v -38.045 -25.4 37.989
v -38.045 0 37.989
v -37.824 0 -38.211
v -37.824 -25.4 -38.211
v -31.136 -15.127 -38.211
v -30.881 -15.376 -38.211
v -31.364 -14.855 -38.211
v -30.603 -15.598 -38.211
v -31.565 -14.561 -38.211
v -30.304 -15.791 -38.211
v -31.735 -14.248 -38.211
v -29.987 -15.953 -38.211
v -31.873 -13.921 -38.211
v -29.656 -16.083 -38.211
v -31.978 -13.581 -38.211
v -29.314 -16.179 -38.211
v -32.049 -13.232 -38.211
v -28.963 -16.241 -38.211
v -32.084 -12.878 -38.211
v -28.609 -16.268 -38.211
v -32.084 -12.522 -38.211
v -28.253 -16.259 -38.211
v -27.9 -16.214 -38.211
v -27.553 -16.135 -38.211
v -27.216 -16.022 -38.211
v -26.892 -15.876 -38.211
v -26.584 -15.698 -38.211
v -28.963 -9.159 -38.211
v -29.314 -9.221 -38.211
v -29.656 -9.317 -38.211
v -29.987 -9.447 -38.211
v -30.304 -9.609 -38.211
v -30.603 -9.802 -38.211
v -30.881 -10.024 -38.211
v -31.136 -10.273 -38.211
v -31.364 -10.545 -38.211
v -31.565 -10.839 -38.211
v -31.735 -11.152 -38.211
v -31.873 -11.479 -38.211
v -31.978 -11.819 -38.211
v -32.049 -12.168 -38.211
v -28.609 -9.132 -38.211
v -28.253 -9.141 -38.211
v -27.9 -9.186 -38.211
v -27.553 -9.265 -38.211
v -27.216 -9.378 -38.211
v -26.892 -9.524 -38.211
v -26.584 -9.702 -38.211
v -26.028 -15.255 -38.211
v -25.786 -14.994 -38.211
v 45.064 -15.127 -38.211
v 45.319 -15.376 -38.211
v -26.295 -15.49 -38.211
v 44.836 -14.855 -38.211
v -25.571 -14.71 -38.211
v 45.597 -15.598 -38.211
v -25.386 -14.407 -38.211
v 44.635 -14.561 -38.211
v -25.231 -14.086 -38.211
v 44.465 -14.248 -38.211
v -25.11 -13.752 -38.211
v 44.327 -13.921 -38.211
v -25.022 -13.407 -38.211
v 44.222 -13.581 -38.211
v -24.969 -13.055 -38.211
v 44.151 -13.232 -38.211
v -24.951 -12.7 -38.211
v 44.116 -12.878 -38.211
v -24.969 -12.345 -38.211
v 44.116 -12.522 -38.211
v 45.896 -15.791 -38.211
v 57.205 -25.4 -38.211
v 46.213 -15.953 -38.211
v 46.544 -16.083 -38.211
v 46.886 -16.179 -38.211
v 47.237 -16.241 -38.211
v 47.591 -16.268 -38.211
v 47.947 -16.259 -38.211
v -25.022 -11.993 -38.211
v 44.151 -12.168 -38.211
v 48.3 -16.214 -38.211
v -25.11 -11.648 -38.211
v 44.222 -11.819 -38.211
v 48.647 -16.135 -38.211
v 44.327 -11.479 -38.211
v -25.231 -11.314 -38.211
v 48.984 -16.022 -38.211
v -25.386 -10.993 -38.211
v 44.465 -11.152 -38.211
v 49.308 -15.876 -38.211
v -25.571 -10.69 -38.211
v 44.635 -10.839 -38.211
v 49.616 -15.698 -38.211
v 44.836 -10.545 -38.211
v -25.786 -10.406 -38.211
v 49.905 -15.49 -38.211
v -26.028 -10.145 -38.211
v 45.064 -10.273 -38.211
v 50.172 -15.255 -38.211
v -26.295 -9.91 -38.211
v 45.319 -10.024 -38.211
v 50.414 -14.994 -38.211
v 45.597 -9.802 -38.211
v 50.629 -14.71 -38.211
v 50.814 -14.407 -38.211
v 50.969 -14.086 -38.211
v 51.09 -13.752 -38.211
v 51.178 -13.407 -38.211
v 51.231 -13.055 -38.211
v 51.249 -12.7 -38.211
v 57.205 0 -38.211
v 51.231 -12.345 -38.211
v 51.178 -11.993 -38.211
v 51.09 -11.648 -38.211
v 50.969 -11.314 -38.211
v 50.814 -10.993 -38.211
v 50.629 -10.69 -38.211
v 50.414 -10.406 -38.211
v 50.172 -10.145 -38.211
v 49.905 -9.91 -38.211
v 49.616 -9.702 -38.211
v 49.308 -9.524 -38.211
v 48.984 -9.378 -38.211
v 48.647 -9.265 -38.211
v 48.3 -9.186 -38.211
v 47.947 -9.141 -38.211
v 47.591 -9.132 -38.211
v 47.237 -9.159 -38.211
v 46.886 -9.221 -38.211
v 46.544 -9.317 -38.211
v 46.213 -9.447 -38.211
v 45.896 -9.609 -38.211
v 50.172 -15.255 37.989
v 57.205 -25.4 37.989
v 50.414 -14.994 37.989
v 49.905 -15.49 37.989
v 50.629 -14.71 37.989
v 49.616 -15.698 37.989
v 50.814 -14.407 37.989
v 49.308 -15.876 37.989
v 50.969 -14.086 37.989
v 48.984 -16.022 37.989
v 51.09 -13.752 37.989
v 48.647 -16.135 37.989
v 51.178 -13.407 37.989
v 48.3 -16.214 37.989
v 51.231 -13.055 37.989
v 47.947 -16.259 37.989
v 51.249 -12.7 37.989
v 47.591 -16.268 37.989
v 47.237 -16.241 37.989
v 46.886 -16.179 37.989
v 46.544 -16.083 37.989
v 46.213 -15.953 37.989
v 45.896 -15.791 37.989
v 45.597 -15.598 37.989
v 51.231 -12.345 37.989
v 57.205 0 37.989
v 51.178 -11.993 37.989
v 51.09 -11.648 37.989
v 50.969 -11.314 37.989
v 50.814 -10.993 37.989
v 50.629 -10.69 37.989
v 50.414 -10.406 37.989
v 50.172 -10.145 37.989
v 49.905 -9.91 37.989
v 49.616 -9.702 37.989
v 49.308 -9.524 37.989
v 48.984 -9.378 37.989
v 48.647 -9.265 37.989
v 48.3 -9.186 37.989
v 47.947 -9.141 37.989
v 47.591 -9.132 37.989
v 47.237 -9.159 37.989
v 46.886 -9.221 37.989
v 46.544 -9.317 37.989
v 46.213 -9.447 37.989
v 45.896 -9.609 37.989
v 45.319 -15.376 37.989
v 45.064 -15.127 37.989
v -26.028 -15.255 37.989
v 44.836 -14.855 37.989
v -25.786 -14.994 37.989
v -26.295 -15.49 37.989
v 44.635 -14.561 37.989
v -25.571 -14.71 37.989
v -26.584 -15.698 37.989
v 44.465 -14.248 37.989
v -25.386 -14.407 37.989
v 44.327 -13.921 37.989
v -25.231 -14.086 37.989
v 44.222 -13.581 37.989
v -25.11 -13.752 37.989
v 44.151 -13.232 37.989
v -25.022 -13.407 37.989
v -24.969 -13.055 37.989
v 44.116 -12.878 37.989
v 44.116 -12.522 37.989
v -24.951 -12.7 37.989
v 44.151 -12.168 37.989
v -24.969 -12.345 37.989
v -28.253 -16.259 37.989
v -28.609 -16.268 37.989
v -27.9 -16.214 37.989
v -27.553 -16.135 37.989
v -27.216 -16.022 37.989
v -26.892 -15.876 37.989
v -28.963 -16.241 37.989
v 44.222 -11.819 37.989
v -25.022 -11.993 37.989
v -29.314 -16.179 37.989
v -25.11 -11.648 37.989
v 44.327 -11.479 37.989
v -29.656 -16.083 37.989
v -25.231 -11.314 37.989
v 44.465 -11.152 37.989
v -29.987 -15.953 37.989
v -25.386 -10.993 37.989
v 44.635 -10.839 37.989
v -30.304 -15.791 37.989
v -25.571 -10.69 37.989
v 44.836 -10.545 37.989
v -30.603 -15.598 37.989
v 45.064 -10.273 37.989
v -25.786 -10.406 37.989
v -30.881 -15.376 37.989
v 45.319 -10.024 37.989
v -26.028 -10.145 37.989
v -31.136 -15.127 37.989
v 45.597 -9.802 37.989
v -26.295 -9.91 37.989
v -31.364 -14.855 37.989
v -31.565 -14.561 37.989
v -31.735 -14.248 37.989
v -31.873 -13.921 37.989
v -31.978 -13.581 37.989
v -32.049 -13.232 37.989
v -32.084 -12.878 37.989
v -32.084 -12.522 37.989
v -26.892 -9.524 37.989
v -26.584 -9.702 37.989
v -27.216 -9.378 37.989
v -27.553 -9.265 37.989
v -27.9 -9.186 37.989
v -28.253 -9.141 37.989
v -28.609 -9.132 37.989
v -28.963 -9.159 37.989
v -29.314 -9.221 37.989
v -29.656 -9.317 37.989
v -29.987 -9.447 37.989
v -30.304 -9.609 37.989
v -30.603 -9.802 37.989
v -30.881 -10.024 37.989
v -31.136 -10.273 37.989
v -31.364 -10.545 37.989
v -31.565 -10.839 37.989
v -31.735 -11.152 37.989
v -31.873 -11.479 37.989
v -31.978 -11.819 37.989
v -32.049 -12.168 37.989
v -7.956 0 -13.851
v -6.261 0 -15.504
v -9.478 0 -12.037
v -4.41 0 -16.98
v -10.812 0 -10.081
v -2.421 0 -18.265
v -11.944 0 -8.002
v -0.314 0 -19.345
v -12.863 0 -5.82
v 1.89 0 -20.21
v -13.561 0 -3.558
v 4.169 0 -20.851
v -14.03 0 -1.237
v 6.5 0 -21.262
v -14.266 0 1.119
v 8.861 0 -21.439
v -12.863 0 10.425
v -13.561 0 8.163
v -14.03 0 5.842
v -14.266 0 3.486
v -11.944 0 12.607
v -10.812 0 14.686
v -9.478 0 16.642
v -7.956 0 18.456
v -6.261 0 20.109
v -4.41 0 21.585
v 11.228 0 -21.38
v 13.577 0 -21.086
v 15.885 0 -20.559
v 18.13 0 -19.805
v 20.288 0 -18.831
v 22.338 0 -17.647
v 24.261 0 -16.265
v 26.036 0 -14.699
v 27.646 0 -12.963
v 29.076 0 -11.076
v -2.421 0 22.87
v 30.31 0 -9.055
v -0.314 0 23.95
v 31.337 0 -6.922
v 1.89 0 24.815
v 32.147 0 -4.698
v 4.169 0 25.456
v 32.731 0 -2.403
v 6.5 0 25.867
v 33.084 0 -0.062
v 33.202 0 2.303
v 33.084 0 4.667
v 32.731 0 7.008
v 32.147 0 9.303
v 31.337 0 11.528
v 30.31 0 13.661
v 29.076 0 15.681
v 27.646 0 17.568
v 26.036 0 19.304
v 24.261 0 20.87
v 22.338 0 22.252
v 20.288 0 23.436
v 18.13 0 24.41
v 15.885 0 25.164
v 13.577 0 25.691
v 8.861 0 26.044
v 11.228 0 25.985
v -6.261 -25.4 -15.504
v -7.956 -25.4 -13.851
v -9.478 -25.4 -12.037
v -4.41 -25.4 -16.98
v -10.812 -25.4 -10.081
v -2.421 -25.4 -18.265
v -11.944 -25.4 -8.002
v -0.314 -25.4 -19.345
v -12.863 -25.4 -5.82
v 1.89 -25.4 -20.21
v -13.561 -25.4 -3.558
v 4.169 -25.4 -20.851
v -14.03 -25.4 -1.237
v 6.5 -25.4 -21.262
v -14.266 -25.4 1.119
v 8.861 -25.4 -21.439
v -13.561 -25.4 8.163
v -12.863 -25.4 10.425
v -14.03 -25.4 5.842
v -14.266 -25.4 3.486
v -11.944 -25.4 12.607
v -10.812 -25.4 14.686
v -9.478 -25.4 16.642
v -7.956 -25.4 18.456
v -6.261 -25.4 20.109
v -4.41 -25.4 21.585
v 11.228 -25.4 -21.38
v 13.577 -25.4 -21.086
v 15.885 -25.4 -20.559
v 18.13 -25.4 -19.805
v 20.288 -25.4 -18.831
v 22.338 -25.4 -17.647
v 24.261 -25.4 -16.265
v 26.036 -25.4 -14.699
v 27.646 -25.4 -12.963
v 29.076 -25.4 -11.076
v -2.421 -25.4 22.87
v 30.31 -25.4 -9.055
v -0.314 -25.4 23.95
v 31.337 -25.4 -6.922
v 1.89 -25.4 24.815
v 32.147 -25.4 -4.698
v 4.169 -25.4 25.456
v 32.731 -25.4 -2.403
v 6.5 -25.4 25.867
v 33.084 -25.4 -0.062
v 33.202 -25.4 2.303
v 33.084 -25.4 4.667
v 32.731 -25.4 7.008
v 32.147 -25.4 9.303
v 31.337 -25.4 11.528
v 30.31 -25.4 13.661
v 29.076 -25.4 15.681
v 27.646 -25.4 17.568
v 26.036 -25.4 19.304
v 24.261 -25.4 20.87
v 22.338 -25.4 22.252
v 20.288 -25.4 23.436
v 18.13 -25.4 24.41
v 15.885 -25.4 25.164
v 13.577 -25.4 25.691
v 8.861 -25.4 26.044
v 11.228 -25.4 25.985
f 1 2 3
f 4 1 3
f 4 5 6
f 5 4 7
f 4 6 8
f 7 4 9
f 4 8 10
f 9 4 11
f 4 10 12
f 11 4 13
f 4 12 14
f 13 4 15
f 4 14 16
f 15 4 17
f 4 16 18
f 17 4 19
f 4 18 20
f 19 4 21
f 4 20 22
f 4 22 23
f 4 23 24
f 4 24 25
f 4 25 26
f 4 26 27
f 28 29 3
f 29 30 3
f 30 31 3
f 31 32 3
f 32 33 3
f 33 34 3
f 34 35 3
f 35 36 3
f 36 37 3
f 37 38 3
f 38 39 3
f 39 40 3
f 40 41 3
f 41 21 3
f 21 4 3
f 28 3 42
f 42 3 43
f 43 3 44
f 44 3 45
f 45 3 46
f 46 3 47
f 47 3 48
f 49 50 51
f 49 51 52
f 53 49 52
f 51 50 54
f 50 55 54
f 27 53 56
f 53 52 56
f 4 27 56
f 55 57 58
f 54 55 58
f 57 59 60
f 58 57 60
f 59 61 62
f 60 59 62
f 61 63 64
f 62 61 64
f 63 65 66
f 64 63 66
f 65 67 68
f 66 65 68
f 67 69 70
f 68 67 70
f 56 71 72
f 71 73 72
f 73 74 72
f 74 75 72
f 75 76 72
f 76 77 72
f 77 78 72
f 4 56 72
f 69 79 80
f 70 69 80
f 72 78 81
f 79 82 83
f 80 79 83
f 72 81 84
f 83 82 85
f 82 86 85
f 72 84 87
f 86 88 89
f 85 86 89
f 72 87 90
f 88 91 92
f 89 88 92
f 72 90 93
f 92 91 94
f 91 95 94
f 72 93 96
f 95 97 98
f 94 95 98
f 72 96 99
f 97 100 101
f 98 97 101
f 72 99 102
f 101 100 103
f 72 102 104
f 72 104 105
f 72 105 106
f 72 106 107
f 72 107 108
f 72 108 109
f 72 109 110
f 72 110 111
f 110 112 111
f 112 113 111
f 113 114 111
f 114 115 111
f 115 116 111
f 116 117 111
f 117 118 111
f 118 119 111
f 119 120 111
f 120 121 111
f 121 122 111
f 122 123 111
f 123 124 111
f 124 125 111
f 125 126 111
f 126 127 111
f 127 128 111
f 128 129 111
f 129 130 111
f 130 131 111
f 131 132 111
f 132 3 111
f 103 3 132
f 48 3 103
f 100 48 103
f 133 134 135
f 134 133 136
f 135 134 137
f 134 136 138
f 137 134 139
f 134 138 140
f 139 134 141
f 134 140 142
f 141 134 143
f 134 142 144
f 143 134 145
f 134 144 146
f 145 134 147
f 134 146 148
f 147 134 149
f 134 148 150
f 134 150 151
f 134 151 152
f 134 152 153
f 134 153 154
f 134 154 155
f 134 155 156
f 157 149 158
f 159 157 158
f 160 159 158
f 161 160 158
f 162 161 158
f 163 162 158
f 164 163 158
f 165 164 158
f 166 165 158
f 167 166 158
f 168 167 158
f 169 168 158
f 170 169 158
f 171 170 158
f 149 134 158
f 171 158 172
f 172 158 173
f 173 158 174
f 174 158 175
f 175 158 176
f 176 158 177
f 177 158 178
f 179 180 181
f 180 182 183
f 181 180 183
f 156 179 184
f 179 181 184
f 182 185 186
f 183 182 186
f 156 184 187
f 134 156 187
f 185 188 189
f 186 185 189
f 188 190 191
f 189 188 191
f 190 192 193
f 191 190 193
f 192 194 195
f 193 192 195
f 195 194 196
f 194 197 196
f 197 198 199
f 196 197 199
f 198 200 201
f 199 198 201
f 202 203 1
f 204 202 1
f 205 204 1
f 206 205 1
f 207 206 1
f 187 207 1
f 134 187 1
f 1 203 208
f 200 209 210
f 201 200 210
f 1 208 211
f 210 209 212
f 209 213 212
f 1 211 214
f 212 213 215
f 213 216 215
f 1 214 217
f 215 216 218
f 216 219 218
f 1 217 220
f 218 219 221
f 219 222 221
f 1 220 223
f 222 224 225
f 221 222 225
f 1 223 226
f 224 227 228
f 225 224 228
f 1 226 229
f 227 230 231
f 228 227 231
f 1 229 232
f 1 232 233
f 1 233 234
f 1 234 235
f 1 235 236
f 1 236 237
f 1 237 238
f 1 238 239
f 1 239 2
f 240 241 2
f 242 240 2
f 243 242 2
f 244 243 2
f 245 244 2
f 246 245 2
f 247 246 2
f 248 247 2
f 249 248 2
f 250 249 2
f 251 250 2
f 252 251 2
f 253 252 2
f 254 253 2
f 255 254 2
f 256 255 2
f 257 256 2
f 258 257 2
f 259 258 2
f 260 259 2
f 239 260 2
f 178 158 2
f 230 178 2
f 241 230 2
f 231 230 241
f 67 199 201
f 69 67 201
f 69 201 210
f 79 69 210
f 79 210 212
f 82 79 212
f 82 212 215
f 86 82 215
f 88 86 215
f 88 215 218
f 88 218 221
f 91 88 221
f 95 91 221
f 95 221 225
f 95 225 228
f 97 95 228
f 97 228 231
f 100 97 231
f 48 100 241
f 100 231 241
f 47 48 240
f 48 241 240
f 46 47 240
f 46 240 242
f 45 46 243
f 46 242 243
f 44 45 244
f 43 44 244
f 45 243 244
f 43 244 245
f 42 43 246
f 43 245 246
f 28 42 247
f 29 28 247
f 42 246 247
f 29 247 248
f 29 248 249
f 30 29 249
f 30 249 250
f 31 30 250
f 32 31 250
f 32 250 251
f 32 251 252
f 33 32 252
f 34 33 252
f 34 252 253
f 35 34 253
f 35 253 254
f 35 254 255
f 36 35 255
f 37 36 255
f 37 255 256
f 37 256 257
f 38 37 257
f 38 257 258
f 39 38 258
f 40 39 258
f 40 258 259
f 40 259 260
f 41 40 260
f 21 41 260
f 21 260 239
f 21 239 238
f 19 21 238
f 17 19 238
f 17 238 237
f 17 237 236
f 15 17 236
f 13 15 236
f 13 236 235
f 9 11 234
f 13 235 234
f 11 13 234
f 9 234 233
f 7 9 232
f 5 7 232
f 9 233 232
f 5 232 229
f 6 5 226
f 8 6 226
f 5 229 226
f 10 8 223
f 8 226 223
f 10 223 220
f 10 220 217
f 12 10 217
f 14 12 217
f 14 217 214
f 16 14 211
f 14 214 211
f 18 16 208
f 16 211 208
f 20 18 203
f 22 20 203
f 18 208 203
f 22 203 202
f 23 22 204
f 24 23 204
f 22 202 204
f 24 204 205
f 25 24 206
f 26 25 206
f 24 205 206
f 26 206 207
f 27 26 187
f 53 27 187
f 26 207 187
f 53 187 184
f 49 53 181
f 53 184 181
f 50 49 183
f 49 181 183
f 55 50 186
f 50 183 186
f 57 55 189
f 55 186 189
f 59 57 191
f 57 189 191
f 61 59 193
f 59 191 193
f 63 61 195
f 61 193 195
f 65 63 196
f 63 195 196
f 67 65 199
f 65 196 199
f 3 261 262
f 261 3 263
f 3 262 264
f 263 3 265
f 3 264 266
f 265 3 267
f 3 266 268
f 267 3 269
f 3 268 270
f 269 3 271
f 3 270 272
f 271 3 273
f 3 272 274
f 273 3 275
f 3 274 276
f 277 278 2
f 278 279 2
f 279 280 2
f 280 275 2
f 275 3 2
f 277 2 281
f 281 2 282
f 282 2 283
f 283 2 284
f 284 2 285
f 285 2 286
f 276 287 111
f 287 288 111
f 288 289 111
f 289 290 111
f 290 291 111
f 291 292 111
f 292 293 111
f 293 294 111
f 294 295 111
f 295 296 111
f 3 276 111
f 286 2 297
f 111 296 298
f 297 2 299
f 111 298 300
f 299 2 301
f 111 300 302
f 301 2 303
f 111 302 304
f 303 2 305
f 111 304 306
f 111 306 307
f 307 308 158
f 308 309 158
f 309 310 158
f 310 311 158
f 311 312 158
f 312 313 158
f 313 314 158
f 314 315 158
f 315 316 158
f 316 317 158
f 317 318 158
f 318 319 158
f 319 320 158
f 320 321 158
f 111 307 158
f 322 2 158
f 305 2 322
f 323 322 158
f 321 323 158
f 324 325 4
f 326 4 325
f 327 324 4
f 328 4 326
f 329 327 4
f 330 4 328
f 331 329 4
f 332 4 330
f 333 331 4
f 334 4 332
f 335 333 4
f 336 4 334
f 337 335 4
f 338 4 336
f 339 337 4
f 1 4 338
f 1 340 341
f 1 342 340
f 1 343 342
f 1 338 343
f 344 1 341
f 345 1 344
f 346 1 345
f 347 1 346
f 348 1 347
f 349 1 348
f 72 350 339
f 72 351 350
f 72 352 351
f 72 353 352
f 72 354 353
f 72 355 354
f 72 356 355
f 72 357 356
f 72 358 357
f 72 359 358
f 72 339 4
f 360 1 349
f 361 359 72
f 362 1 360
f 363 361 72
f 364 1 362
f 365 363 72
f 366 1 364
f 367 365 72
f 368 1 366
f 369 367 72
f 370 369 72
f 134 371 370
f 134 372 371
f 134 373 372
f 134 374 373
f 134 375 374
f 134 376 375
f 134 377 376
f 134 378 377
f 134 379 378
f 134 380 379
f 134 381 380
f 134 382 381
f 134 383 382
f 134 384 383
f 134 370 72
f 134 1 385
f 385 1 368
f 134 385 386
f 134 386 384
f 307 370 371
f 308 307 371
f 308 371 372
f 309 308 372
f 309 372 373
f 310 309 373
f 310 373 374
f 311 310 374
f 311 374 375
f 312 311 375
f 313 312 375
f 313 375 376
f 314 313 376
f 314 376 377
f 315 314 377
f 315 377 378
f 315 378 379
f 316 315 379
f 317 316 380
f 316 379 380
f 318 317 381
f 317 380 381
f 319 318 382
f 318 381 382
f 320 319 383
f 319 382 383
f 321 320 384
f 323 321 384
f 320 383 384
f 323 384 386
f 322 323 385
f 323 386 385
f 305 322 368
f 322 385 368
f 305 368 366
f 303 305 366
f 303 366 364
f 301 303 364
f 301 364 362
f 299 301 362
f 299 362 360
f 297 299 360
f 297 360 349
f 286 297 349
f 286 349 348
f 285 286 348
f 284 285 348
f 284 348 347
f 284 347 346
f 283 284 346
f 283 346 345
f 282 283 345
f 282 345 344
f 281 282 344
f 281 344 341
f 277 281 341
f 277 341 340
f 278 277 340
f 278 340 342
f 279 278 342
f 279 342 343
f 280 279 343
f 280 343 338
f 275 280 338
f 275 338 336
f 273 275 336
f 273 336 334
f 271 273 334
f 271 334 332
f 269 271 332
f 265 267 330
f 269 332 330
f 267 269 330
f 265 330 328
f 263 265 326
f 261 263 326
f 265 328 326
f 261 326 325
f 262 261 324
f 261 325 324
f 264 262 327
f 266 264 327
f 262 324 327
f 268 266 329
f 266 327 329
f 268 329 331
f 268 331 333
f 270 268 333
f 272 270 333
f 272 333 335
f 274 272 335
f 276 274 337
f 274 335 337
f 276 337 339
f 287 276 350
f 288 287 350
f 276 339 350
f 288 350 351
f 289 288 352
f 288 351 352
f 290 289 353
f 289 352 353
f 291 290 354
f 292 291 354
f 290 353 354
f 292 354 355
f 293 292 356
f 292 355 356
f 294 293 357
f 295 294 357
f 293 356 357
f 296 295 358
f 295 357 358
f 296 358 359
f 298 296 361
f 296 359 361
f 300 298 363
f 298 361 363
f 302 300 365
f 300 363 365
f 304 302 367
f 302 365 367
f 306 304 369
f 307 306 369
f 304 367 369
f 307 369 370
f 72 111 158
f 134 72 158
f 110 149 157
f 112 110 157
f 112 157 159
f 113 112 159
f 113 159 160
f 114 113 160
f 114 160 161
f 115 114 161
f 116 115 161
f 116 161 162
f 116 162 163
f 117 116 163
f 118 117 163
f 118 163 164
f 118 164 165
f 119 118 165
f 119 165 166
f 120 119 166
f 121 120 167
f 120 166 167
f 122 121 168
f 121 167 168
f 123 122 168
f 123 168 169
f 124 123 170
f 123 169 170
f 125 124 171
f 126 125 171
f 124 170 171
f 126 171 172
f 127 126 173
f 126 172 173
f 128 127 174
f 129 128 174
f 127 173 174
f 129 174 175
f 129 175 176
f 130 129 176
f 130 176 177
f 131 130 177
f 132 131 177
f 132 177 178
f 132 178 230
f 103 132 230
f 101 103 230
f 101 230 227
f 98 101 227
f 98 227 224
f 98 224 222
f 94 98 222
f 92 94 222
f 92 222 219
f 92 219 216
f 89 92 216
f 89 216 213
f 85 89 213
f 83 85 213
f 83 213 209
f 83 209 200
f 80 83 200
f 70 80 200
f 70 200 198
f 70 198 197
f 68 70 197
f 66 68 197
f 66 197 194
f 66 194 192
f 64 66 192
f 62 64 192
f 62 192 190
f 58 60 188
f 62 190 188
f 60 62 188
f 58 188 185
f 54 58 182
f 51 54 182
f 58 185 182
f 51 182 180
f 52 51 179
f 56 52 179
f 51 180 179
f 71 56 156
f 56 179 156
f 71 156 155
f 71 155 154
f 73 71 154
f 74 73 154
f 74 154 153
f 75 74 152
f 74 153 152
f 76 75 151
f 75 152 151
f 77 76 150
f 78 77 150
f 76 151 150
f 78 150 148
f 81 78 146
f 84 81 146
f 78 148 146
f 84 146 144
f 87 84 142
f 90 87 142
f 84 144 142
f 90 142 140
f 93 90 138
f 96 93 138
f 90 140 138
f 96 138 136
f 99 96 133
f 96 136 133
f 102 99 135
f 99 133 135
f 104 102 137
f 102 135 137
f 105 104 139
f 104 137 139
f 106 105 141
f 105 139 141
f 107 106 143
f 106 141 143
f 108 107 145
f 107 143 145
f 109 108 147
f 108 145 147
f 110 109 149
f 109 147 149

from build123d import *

# Parameters (mm, degrees)
F1_DEPTH = 25.4
F2_R     = 23.749
F3_DEPTH = 25.401
F4_R     = 3.5687
F5_DEPTH = 76.201


with BuildPart() as f1:
    # F0 (on Front) → F1 (new body)
    with BuildSketch(Plane.XZ):
        Polygon((57.205297, 37.989184), (-38.044703, 37.989184), (-37.823511, -38.210816), (57.205297, -38.210816), align=None)
    extrude(amount=F1_DEPTH)

    # F2 (on face) → F3 (cut, through all)
    with BuildSketch(Plane.XZ.offset(25.4)):
        with Locations((9.453297, 2.302564)):
            Circle(F2_R)
    extrude(amount=-F3_DEPTH, mode=Mode.SUBTRACT)

    # F4 (on face) → F5 (cut, through all)
    with BuildSketch(Plane.XY.offset(37.989184)):
        with Locations((-28.519703, -12.7)):
            Circle(F4_R)
        with Locations((47.680297, -12.7)):
            Circle(F4_R)
    extrude(amount=-F5_DEPTH, mode=Mode.SUBTRACT)


solid = f1.part
